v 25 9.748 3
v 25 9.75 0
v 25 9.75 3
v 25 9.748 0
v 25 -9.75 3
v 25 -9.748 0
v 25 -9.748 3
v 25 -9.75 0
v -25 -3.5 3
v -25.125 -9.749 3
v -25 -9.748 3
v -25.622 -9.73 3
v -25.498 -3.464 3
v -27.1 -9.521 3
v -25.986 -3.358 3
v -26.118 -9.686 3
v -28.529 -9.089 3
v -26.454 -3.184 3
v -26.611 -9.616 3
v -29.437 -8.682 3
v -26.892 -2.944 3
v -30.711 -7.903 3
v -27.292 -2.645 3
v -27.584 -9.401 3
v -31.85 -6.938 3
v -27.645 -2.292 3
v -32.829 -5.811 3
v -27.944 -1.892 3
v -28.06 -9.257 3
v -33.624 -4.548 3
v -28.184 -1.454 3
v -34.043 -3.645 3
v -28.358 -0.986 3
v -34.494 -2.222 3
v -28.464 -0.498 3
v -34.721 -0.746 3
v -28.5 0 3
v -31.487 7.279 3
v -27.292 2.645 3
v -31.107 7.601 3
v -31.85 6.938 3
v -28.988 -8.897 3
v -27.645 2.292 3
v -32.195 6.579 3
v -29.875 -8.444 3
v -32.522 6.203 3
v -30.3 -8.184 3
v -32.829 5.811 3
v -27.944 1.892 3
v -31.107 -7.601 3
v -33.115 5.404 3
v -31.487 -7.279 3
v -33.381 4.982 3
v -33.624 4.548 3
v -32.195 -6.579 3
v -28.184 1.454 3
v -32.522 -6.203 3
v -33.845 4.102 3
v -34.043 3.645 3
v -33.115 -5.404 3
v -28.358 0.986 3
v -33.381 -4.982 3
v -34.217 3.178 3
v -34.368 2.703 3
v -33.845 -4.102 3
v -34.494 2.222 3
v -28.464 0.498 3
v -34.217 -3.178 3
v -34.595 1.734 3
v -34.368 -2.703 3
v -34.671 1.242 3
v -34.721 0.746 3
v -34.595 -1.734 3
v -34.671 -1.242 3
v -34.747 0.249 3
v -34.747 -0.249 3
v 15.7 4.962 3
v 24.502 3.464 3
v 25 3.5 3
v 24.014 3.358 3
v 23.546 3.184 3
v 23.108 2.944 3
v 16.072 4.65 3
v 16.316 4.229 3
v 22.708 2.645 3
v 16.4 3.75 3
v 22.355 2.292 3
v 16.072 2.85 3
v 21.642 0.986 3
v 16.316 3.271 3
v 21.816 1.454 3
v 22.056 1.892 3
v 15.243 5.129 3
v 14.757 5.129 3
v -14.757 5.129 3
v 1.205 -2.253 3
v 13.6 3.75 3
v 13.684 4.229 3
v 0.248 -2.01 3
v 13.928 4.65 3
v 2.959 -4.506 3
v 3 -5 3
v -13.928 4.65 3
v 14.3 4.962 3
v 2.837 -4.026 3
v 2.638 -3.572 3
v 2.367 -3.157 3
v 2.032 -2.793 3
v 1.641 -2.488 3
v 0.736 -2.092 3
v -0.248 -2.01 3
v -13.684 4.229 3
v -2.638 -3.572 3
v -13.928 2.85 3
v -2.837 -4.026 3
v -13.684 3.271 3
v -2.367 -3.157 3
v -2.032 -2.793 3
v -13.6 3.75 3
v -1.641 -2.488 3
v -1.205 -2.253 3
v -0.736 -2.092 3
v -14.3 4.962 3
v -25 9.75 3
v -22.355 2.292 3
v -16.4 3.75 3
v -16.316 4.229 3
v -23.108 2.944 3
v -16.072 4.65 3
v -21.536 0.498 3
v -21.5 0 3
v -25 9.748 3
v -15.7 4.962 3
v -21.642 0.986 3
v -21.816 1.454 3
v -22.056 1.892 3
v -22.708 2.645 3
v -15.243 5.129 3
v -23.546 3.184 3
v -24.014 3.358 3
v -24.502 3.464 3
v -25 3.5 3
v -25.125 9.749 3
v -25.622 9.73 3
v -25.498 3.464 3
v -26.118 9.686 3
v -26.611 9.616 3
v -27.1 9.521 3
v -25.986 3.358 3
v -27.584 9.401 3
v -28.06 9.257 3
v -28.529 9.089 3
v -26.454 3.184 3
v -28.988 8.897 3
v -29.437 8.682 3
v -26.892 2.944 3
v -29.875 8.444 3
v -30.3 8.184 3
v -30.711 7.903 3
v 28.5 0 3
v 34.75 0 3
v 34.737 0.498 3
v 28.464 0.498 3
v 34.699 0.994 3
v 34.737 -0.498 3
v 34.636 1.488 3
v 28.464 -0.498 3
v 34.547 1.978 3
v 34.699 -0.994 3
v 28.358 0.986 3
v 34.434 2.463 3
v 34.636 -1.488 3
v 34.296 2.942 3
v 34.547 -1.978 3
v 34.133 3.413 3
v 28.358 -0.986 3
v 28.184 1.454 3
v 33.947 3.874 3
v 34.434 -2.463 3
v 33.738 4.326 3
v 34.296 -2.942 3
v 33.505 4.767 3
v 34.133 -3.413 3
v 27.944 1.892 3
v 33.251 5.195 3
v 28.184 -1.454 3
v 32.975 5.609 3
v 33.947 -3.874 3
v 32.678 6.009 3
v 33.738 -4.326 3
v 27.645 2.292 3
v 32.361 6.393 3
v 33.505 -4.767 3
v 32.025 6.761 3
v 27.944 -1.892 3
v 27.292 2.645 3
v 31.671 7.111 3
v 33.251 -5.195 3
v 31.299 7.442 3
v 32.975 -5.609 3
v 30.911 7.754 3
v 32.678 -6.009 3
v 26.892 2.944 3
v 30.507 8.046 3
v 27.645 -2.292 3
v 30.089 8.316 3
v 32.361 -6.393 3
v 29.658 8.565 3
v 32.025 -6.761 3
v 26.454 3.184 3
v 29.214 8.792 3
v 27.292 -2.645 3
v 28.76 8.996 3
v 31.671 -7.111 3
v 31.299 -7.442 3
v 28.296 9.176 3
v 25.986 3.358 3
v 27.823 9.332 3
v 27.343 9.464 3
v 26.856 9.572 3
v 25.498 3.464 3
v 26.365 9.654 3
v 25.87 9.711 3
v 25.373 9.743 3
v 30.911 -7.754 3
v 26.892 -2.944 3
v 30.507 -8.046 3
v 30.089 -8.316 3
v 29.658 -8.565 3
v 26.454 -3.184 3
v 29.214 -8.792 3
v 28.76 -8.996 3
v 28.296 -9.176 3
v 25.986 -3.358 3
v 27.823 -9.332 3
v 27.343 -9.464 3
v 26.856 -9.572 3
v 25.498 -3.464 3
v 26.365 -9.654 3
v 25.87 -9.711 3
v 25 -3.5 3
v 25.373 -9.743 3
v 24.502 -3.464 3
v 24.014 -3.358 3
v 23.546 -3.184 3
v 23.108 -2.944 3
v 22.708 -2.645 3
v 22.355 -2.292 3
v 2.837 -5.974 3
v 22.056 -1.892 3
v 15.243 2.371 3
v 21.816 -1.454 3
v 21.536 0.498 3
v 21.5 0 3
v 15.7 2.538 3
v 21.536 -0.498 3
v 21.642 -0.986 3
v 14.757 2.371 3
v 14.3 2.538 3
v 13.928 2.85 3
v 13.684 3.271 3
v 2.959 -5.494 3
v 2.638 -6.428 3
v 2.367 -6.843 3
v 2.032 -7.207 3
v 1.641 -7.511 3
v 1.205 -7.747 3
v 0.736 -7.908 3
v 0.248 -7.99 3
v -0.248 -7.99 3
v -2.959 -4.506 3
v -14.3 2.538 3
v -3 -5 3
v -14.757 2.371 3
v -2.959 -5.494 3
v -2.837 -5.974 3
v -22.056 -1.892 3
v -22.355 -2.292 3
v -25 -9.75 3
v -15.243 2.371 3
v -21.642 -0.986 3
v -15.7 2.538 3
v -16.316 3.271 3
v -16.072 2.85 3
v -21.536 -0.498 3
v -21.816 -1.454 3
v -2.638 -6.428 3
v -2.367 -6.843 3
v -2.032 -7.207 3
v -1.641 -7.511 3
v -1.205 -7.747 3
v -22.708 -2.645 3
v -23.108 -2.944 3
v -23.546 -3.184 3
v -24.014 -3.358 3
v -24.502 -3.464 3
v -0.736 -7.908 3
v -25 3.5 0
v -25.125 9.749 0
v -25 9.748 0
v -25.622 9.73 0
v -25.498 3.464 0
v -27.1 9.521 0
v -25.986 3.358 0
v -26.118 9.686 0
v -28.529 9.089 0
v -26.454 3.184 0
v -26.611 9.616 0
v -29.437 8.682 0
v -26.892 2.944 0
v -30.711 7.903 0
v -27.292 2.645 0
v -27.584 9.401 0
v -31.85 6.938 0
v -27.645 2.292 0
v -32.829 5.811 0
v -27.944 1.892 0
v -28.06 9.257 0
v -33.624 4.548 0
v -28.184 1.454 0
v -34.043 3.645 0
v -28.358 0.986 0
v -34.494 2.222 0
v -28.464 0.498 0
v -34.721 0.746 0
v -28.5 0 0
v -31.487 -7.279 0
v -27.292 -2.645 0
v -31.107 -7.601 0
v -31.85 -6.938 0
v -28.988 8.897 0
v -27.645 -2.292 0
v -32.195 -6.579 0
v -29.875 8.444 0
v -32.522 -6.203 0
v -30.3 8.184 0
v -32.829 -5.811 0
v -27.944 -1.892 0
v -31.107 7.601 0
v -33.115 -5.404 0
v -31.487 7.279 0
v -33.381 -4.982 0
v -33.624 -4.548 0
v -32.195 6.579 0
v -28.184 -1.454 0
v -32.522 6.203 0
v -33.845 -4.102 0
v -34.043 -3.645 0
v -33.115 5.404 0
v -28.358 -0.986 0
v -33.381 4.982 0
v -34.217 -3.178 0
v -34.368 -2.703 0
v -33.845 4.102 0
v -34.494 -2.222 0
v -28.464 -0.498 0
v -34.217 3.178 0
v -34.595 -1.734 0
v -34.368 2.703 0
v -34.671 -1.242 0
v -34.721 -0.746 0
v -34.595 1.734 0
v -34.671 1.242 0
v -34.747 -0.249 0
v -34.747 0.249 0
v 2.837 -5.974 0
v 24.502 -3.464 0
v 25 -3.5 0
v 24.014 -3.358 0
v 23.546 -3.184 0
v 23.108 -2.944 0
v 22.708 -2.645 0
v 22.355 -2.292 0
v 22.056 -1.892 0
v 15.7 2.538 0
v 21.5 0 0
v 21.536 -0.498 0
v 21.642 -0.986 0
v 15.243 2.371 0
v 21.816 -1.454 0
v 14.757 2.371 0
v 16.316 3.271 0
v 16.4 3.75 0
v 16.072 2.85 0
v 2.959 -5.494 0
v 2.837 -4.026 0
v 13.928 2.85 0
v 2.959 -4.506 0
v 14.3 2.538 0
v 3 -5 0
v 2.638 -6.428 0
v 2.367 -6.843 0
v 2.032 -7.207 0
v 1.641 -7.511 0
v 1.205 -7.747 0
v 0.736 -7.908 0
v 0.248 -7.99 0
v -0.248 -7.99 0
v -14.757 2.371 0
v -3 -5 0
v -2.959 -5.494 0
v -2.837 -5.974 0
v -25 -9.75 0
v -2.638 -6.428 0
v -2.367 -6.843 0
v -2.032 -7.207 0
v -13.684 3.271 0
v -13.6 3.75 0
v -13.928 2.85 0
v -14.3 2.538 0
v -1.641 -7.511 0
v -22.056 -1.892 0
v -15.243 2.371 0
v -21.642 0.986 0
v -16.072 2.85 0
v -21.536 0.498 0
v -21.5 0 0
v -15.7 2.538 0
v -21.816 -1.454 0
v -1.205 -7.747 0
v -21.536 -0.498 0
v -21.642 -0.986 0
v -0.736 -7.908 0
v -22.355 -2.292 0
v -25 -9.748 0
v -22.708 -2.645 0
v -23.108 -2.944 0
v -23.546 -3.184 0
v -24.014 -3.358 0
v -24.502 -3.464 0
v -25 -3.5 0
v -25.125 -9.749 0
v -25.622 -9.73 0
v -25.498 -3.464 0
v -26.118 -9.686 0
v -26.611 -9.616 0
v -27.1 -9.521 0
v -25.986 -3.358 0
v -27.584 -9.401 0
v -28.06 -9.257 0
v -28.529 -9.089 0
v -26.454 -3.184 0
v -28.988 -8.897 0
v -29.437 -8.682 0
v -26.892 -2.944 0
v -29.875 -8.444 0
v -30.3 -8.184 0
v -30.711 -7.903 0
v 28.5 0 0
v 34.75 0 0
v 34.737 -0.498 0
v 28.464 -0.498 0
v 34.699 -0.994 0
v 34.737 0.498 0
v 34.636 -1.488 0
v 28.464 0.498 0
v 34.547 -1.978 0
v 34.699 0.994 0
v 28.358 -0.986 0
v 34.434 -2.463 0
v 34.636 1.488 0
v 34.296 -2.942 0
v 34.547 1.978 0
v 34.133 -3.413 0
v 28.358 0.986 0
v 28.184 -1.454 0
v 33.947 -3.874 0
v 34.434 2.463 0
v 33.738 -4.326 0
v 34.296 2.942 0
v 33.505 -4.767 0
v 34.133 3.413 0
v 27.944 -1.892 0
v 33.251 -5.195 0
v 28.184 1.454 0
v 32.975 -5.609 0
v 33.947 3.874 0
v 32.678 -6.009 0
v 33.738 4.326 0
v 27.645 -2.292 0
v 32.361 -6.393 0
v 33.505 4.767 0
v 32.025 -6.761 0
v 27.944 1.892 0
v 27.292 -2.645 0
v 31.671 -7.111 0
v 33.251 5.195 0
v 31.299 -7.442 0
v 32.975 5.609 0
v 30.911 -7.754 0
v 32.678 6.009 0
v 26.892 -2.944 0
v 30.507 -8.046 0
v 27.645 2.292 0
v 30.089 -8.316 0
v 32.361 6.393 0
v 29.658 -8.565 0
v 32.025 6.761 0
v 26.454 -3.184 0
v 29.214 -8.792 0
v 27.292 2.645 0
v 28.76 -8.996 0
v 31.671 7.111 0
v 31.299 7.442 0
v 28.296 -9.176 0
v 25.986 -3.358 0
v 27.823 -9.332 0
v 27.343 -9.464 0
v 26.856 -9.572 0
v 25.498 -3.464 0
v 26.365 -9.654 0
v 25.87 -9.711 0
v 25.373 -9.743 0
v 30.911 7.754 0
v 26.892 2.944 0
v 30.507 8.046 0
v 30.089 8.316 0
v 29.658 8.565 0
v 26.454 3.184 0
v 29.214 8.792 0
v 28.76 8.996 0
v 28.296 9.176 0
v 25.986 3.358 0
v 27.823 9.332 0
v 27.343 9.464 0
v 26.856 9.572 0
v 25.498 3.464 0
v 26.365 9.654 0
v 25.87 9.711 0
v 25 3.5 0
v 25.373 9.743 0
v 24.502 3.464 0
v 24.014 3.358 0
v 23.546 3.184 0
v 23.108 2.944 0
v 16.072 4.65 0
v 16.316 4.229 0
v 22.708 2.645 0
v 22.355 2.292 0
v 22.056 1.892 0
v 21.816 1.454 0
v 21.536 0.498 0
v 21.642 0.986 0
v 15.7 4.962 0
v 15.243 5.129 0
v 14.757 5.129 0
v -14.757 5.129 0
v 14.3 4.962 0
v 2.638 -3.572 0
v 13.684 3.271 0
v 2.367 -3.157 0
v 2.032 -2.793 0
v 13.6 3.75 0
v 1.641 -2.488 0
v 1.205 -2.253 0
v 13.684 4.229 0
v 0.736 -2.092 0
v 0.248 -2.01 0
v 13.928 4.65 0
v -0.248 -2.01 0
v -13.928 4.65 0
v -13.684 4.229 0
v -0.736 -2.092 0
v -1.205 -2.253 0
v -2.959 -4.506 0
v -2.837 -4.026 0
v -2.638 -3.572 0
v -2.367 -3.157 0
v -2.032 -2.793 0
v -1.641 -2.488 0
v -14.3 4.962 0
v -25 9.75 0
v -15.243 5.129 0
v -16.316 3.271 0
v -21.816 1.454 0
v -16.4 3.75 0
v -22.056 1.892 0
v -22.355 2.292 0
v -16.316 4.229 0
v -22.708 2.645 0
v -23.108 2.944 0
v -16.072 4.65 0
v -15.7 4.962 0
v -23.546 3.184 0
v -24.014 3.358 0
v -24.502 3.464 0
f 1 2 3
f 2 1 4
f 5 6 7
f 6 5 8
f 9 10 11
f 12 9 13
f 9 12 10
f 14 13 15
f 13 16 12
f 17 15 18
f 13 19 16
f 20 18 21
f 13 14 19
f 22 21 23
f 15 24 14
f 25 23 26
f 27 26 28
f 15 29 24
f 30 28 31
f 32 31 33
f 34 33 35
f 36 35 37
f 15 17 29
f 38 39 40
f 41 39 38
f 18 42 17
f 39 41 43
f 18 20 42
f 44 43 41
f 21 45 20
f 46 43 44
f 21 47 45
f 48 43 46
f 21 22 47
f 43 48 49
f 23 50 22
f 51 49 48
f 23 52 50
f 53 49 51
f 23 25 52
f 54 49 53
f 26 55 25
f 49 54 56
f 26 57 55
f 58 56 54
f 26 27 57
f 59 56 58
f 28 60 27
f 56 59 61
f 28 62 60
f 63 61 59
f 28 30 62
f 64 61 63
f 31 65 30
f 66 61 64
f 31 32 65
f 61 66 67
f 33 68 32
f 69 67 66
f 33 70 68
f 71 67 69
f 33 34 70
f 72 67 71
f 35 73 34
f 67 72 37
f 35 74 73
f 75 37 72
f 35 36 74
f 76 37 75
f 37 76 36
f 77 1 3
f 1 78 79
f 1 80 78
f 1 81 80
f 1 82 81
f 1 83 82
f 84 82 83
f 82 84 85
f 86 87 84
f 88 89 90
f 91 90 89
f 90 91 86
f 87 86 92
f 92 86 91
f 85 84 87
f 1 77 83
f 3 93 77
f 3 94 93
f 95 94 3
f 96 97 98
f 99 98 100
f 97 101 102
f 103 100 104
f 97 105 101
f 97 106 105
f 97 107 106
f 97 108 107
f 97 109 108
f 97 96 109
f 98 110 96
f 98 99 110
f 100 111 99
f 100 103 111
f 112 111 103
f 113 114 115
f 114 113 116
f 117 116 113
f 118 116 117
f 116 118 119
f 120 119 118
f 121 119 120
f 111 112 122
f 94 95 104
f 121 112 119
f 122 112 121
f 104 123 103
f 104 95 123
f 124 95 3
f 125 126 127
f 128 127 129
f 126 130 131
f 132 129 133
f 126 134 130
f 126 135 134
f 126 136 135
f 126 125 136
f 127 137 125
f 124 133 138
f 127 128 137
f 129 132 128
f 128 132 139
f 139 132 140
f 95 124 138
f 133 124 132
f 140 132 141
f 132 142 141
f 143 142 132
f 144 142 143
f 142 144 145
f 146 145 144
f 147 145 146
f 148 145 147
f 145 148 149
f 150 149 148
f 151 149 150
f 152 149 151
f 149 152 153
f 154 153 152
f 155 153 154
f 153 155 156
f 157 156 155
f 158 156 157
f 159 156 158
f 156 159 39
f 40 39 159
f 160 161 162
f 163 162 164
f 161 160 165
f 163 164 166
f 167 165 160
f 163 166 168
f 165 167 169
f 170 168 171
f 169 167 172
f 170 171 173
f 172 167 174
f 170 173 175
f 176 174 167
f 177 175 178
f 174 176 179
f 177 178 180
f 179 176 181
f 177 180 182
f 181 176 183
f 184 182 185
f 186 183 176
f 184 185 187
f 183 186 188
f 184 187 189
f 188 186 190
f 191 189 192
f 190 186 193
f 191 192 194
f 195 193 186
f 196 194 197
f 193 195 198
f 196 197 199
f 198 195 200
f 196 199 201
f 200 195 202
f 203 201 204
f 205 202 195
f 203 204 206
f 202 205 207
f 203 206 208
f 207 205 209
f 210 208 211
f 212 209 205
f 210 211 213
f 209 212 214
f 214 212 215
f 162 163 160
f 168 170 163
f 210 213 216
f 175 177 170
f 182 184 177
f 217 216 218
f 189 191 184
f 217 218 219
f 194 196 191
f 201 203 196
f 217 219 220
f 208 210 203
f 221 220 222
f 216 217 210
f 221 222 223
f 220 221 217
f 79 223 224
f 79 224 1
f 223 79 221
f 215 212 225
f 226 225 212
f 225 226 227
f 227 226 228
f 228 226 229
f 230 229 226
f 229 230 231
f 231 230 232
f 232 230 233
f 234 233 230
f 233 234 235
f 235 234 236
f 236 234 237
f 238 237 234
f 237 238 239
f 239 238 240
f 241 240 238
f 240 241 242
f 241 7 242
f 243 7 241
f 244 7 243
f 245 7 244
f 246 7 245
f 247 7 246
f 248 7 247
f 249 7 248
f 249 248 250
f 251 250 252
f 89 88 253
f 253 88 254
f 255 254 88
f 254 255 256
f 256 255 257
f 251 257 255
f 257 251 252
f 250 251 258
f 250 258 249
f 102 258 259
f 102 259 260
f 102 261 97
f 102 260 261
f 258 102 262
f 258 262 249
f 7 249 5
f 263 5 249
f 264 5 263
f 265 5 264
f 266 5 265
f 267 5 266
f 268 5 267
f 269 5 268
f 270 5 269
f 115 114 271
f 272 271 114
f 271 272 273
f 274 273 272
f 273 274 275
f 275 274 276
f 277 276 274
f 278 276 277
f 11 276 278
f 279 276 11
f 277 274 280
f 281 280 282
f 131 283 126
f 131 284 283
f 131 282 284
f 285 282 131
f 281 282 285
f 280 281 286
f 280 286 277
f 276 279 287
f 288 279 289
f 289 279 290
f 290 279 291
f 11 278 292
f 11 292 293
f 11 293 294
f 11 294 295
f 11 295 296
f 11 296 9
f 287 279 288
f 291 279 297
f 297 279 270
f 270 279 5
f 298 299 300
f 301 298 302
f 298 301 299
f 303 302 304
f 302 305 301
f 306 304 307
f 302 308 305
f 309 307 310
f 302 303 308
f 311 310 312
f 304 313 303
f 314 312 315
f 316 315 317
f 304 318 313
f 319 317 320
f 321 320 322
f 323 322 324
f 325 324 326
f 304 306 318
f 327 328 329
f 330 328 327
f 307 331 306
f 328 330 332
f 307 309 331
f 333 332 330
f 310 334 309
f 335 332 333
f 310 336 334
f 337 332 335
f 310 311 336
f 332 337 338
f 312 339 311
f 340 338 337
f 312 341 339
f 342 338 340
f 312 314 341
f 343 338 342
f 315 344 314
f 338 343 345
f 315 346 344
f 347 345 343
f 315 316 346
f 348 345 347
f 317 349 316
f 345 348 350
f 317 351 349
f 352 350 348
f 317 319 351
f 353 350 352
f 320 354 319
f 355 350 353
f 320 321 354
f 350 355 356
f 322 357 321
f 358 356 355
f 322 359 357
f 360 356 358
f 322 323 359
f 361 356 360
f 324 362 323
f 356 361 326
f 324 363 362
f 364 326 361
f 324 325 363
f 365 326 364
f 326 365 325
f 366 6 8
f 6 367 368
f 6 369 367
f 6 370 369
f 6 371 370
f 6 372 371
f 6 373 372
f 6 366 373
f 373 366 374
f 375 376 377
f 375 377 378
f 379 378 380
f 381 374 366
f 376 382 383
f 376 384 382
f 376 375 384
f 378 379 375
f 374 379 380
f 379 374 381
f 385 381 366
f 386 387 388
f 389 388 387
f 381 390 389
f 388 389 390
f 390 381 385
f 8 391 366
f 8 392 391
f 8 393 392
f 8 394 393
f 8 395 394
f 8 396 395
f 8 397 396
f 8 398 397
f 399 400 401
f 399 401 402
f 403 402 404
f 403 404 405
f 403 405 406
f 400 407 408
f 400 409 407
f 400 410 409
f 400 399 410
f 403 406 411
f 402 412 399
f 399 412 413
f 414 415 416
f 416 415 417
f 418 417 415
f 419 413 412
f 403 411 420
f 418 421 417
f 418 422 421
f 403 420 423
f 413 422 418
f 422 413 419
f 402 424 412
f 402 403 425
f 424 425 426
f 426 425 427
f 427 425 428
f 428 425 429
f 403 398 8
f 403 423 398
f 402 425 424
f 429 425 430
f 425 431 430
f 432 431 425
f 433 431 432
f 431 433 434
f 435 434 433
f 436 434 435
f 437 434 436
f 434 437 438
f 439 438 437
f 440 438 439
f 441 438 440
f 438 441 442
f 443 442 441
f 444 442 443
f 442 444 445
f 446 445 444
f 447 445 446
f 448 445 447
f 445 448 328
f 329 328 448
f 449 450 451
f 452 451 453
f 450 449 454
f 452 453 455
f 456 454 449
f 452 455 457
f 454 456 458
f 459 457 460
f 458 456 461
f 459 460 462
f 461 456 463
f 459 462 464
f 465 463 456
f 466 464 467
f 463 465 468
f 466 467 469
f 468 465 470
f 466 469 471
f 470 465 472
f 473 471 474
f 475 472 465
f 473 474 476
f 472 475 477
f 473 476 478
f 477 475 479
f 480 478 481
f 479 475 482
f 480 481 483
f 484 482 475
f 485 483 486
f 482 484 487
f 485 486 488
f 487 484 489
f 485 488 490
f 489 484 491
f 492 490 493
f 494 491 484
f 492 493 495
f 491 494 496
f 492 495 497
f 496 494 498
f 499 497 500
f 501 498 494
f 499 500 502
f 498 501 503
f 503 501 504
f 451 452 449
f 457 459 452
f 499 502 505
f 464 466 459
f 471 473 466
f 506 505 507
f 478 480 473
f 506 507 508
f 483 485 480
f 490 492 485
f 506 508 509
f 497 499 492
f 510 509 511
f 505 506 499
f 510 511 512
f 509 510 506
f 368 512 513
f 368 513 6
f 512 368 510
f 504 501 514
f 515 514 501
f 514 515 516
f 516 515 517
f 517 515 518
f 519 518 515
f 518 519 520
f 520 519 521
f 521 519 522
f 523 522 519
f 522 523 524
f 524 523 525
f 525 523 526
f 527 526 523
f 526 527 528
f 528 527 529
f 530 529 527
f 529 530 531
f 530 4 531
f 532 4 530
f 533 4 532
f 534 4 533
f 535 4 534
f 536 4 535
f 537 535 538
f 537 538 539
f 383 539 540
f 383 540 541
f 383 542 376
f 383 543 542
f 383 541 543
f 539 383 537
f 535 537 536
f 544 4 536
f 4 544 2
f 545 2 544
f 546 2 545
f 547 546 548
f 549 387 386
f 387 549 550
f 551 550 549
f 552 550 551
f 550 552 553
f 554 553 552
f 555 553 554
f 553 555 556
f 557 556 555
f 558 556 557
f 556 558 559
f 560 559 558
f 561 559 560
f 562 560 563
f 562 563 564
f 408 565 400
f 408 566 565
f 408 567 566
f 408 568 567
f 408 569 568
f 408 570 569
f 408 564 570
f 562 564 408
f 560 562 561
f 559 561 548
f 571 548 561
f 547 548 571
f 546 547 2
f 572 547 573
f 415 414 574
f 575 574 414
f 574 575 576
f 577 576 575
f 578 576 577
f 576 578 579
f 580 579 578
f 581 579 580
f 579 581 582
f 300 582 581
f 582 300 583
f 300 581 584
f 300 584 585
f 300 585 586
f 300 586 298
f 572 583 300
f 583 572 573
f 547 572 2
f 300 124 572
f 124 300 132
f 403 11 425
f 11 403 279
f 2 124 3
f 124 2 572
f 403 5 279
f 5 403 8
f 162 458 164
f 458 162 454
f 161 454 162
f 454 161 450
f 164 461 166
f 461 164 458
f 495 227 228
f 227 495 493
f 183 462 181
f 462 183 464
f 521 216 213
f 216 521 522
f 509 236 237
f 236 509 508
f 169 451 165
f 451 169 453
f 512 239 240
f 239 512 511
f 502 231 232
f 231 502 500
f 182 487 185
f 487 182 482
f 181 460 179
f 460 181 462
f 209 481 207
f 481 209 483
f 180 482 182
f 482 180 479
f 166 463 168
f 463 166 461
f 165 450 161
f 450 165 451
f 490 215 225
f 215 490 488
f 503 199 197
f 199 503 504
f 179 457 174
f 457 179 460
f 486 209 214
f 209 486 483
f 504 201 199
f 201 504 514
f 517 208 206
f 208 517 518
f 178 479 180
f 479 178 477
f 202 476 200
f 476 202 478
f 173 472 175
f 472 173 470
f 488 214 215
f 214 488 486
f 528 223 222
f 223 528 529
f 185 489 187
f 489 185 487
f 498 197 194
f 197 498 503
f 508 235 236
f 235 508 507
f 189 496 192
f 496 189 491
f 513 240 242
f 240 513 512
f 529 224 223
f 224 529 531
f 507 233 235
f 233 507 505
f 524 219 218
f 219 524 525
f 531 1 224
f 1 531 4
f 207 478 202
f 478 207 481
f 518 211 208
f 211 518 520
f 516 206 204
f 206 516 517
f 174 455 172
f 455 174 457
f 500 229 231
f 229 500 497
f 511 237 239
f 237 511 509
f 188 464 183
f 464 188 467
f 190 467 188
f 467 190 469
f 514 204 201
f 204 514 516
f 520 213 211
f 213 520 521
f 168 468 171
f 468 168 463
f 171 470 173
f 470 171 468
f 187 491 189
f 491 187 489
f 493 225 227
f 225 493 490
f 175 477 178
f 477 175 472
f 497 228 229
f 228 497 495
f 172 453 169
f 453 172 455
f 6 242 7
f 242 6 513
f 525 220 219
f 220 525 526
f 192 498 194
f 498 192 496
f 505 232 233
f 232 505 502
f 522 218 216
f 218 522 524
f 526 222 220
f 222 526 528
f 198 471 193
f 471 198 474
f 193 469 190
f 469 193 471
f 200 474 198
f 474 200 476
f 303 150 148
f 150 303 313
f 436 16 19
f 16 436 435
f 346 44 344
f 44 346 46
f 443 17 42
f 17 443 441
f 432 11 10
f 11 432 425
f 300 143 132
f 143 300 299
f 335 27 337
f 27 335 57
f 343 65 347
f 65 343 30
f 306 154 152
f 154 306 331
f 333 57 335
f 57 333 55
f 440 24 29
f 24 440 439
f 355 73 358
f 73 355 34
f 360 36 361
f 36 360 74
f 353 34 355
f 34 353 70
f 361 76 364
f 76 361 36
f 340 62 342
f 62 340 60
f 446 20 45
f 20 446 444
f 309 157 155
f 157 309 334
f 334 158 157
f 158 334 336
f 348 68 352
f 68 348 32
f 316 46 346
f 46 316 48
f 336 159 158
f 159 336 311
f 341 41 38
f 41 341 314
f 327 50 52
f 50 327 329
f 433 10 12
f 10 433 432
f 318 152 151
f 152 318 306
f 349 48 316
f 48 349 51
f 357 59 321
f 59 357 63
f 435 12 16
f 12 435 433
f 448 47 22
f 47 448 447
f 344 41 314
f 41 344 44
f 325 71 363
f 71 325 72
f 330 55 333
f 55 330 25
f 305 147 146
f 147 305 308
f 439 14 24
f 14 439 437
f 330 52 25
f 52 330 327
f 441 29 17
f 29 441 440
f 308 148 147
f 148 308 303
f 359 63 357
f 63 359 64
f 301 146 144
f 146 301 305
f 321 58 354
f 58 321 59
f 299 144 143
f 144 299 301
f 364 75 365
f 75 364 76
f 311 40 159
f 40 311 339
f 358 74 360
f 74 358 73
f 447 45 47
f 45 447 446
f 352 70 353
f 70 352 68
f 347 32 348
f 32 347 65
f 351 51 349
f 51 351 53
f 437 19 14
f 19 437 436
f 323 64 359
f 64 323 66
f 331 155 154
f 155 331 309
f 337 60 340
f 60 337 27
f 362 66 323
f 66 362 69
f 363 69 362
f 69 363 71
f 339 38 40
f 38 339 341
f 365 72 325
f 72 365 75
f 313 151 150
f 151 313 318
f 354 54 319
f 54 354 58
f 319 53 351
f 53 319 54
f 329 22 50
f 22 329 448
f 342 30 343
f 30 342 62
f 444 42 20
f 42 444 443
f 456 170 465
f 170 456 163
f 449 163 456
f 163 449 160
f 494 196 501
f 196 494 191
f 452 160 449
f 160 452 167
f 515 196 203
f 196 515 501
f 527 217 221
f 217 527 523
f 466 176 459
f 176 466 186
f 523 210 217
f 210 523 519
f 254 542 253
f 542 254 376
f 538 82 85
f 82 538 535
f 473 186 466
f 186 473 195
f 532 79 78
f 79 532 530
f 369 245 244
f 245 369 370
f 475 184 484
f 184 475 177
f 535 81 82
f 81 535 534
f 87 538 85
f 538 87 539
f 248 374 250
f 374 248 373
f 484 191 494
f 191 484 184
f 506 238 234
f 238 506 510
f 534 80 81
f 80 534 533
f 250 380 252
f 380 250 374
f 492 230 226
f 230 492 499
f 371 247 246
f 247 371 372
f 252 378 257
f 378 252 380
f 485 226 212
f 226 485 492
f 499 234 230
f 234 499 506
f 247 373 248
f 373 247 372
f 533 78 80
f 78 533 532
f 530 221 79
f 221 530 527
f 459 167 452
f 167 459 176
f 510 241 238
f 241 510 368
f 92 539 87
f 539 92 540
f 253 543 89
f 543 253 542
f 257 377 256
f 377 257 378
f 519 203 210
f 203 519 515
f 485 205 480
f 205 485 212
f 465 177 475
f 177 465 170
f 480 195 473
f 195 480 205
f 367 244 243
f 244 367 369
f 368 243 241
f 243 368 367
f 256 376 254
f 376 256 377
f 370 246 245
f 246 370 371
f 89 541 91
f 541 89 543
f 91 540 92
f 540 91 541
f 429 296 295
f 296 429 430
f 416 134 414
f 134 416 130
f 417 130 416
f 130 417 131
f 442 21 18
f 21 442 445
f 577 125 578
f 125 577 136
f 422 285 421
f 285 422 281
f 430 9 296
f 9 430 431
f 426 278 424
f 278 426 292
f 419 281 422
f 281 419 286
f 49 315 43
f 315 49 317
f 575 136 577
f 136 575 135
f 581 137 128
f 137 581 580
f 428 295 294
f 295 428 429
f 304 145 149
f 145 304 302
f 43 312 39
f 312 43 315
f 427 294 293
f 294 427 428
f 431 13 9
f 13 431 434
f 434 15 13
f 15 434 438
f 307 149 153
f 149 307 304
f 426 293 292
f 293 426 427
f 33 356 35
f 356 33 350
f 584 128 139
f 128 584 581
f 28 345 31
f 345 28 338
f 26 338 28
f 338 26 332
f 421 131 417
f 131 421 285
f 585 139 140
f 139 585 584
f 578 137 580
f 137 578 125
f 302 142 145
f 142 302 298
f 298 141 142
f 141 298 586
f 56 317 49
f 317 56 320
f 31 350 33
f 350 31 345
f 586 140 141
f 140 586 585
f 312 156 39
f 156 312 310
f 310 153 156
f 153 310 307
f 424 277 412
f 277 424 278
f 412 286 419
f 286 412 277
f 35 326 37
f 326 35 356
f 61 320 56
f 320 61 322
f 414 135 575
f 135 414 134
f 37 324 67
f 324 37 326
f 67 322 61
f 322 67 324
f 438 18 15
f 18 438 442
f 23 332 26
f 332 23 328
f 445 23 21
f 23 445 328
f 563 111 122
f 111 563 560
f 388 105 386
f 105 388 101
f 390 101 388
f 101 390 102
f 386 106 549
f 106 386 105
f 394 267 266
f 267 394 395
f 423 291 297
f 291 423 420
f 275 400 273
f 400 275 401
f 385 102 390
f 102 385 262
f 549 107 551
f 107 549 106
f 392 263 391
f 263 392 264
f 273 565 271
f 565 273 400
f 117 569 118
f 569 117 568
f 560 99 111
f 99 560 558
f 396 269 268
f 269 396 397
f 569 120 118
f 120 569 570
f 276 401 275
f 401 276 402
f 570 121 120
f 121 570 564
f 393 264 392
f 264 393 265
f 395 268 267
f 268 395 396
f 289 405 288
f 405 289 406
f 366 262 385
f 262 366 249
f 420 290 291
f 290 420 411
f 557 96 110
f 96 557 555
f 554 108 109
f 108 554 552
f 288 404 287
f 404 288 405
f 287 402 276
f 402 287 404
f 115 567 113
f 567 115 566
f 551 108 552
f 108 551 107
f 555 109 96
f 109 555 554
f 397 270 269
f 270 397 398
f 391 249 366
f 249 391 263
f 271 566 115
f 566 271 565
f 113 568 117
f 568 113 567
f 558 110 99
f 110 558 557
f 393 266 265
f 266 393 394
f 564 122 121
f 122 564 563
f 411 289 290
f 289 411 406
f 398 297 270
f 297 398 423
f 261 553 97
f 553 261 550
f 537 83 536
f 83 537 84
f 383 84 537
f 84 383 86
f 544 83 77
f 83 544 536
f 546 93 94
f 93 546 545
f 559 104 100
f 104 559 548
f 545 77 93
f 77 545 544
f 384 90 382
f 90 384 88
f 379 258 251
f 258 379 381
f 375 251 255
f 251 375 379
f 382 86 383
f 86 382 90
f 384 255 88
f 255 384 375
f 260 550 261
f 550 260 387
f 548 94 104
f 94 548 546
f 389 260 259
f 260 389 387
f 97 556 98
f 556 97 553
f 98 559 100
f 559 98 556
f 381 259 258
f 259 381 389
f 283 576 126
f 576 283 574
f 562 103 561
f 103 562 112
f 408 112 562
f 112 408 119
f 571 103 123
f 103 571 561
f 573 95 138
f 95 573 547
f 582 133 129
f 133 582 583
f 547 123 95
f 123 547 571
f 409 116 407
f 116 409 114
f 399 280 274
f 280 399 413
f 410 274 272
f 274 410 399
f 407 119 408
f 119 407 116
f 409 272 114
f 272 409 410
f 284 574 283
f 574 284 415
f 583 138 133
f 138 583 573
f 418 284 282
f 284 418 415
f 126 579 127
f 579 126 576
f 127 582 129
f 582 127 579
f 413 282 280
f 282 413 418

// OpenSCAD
$fa=0.5; // default minimum facet angle is now 0.5
$fs=0.5; // default minimum facet size is now 0.5 mm

difference() {
    union() {
        //main body
        translate([0, 0, 3/2]) 
        cube([50, 19.5, 3], center = true);
        
        //x+ cylinder
        color("green")
        translate([25, 0, 3/2]) 
        cylinder(h = 3, r = 19.5/2, center = true);
        
        //x- cylinder
        color("green")
        translate([-25, 0, 3/2]) 
        cylinder(h = 3, r = 19.5/2, center = true);
    }
    
    //holes in cylinders
    translate([25, 0, 3/2]) 
    cylinder(h = 4, r = 3.5, center = true);
    

    translate([-25, 0, 3/2]) 
    cylinder(h = 4, r = 3.5, center = true);
    
    //hole for center
    translate([0, -5, 3/2]) 
    cylinder(h = 4, r = 3, center = true);
    
     //holes for backplate screws
    translate([15, 3.75, 3/2]) 
    cylinder(h = 4, r = 1.4, center = true);
    
    translate([-15, 3.75, 3/2]) 
    cylinder(h = 4, r = 1.4, center = true);
}
